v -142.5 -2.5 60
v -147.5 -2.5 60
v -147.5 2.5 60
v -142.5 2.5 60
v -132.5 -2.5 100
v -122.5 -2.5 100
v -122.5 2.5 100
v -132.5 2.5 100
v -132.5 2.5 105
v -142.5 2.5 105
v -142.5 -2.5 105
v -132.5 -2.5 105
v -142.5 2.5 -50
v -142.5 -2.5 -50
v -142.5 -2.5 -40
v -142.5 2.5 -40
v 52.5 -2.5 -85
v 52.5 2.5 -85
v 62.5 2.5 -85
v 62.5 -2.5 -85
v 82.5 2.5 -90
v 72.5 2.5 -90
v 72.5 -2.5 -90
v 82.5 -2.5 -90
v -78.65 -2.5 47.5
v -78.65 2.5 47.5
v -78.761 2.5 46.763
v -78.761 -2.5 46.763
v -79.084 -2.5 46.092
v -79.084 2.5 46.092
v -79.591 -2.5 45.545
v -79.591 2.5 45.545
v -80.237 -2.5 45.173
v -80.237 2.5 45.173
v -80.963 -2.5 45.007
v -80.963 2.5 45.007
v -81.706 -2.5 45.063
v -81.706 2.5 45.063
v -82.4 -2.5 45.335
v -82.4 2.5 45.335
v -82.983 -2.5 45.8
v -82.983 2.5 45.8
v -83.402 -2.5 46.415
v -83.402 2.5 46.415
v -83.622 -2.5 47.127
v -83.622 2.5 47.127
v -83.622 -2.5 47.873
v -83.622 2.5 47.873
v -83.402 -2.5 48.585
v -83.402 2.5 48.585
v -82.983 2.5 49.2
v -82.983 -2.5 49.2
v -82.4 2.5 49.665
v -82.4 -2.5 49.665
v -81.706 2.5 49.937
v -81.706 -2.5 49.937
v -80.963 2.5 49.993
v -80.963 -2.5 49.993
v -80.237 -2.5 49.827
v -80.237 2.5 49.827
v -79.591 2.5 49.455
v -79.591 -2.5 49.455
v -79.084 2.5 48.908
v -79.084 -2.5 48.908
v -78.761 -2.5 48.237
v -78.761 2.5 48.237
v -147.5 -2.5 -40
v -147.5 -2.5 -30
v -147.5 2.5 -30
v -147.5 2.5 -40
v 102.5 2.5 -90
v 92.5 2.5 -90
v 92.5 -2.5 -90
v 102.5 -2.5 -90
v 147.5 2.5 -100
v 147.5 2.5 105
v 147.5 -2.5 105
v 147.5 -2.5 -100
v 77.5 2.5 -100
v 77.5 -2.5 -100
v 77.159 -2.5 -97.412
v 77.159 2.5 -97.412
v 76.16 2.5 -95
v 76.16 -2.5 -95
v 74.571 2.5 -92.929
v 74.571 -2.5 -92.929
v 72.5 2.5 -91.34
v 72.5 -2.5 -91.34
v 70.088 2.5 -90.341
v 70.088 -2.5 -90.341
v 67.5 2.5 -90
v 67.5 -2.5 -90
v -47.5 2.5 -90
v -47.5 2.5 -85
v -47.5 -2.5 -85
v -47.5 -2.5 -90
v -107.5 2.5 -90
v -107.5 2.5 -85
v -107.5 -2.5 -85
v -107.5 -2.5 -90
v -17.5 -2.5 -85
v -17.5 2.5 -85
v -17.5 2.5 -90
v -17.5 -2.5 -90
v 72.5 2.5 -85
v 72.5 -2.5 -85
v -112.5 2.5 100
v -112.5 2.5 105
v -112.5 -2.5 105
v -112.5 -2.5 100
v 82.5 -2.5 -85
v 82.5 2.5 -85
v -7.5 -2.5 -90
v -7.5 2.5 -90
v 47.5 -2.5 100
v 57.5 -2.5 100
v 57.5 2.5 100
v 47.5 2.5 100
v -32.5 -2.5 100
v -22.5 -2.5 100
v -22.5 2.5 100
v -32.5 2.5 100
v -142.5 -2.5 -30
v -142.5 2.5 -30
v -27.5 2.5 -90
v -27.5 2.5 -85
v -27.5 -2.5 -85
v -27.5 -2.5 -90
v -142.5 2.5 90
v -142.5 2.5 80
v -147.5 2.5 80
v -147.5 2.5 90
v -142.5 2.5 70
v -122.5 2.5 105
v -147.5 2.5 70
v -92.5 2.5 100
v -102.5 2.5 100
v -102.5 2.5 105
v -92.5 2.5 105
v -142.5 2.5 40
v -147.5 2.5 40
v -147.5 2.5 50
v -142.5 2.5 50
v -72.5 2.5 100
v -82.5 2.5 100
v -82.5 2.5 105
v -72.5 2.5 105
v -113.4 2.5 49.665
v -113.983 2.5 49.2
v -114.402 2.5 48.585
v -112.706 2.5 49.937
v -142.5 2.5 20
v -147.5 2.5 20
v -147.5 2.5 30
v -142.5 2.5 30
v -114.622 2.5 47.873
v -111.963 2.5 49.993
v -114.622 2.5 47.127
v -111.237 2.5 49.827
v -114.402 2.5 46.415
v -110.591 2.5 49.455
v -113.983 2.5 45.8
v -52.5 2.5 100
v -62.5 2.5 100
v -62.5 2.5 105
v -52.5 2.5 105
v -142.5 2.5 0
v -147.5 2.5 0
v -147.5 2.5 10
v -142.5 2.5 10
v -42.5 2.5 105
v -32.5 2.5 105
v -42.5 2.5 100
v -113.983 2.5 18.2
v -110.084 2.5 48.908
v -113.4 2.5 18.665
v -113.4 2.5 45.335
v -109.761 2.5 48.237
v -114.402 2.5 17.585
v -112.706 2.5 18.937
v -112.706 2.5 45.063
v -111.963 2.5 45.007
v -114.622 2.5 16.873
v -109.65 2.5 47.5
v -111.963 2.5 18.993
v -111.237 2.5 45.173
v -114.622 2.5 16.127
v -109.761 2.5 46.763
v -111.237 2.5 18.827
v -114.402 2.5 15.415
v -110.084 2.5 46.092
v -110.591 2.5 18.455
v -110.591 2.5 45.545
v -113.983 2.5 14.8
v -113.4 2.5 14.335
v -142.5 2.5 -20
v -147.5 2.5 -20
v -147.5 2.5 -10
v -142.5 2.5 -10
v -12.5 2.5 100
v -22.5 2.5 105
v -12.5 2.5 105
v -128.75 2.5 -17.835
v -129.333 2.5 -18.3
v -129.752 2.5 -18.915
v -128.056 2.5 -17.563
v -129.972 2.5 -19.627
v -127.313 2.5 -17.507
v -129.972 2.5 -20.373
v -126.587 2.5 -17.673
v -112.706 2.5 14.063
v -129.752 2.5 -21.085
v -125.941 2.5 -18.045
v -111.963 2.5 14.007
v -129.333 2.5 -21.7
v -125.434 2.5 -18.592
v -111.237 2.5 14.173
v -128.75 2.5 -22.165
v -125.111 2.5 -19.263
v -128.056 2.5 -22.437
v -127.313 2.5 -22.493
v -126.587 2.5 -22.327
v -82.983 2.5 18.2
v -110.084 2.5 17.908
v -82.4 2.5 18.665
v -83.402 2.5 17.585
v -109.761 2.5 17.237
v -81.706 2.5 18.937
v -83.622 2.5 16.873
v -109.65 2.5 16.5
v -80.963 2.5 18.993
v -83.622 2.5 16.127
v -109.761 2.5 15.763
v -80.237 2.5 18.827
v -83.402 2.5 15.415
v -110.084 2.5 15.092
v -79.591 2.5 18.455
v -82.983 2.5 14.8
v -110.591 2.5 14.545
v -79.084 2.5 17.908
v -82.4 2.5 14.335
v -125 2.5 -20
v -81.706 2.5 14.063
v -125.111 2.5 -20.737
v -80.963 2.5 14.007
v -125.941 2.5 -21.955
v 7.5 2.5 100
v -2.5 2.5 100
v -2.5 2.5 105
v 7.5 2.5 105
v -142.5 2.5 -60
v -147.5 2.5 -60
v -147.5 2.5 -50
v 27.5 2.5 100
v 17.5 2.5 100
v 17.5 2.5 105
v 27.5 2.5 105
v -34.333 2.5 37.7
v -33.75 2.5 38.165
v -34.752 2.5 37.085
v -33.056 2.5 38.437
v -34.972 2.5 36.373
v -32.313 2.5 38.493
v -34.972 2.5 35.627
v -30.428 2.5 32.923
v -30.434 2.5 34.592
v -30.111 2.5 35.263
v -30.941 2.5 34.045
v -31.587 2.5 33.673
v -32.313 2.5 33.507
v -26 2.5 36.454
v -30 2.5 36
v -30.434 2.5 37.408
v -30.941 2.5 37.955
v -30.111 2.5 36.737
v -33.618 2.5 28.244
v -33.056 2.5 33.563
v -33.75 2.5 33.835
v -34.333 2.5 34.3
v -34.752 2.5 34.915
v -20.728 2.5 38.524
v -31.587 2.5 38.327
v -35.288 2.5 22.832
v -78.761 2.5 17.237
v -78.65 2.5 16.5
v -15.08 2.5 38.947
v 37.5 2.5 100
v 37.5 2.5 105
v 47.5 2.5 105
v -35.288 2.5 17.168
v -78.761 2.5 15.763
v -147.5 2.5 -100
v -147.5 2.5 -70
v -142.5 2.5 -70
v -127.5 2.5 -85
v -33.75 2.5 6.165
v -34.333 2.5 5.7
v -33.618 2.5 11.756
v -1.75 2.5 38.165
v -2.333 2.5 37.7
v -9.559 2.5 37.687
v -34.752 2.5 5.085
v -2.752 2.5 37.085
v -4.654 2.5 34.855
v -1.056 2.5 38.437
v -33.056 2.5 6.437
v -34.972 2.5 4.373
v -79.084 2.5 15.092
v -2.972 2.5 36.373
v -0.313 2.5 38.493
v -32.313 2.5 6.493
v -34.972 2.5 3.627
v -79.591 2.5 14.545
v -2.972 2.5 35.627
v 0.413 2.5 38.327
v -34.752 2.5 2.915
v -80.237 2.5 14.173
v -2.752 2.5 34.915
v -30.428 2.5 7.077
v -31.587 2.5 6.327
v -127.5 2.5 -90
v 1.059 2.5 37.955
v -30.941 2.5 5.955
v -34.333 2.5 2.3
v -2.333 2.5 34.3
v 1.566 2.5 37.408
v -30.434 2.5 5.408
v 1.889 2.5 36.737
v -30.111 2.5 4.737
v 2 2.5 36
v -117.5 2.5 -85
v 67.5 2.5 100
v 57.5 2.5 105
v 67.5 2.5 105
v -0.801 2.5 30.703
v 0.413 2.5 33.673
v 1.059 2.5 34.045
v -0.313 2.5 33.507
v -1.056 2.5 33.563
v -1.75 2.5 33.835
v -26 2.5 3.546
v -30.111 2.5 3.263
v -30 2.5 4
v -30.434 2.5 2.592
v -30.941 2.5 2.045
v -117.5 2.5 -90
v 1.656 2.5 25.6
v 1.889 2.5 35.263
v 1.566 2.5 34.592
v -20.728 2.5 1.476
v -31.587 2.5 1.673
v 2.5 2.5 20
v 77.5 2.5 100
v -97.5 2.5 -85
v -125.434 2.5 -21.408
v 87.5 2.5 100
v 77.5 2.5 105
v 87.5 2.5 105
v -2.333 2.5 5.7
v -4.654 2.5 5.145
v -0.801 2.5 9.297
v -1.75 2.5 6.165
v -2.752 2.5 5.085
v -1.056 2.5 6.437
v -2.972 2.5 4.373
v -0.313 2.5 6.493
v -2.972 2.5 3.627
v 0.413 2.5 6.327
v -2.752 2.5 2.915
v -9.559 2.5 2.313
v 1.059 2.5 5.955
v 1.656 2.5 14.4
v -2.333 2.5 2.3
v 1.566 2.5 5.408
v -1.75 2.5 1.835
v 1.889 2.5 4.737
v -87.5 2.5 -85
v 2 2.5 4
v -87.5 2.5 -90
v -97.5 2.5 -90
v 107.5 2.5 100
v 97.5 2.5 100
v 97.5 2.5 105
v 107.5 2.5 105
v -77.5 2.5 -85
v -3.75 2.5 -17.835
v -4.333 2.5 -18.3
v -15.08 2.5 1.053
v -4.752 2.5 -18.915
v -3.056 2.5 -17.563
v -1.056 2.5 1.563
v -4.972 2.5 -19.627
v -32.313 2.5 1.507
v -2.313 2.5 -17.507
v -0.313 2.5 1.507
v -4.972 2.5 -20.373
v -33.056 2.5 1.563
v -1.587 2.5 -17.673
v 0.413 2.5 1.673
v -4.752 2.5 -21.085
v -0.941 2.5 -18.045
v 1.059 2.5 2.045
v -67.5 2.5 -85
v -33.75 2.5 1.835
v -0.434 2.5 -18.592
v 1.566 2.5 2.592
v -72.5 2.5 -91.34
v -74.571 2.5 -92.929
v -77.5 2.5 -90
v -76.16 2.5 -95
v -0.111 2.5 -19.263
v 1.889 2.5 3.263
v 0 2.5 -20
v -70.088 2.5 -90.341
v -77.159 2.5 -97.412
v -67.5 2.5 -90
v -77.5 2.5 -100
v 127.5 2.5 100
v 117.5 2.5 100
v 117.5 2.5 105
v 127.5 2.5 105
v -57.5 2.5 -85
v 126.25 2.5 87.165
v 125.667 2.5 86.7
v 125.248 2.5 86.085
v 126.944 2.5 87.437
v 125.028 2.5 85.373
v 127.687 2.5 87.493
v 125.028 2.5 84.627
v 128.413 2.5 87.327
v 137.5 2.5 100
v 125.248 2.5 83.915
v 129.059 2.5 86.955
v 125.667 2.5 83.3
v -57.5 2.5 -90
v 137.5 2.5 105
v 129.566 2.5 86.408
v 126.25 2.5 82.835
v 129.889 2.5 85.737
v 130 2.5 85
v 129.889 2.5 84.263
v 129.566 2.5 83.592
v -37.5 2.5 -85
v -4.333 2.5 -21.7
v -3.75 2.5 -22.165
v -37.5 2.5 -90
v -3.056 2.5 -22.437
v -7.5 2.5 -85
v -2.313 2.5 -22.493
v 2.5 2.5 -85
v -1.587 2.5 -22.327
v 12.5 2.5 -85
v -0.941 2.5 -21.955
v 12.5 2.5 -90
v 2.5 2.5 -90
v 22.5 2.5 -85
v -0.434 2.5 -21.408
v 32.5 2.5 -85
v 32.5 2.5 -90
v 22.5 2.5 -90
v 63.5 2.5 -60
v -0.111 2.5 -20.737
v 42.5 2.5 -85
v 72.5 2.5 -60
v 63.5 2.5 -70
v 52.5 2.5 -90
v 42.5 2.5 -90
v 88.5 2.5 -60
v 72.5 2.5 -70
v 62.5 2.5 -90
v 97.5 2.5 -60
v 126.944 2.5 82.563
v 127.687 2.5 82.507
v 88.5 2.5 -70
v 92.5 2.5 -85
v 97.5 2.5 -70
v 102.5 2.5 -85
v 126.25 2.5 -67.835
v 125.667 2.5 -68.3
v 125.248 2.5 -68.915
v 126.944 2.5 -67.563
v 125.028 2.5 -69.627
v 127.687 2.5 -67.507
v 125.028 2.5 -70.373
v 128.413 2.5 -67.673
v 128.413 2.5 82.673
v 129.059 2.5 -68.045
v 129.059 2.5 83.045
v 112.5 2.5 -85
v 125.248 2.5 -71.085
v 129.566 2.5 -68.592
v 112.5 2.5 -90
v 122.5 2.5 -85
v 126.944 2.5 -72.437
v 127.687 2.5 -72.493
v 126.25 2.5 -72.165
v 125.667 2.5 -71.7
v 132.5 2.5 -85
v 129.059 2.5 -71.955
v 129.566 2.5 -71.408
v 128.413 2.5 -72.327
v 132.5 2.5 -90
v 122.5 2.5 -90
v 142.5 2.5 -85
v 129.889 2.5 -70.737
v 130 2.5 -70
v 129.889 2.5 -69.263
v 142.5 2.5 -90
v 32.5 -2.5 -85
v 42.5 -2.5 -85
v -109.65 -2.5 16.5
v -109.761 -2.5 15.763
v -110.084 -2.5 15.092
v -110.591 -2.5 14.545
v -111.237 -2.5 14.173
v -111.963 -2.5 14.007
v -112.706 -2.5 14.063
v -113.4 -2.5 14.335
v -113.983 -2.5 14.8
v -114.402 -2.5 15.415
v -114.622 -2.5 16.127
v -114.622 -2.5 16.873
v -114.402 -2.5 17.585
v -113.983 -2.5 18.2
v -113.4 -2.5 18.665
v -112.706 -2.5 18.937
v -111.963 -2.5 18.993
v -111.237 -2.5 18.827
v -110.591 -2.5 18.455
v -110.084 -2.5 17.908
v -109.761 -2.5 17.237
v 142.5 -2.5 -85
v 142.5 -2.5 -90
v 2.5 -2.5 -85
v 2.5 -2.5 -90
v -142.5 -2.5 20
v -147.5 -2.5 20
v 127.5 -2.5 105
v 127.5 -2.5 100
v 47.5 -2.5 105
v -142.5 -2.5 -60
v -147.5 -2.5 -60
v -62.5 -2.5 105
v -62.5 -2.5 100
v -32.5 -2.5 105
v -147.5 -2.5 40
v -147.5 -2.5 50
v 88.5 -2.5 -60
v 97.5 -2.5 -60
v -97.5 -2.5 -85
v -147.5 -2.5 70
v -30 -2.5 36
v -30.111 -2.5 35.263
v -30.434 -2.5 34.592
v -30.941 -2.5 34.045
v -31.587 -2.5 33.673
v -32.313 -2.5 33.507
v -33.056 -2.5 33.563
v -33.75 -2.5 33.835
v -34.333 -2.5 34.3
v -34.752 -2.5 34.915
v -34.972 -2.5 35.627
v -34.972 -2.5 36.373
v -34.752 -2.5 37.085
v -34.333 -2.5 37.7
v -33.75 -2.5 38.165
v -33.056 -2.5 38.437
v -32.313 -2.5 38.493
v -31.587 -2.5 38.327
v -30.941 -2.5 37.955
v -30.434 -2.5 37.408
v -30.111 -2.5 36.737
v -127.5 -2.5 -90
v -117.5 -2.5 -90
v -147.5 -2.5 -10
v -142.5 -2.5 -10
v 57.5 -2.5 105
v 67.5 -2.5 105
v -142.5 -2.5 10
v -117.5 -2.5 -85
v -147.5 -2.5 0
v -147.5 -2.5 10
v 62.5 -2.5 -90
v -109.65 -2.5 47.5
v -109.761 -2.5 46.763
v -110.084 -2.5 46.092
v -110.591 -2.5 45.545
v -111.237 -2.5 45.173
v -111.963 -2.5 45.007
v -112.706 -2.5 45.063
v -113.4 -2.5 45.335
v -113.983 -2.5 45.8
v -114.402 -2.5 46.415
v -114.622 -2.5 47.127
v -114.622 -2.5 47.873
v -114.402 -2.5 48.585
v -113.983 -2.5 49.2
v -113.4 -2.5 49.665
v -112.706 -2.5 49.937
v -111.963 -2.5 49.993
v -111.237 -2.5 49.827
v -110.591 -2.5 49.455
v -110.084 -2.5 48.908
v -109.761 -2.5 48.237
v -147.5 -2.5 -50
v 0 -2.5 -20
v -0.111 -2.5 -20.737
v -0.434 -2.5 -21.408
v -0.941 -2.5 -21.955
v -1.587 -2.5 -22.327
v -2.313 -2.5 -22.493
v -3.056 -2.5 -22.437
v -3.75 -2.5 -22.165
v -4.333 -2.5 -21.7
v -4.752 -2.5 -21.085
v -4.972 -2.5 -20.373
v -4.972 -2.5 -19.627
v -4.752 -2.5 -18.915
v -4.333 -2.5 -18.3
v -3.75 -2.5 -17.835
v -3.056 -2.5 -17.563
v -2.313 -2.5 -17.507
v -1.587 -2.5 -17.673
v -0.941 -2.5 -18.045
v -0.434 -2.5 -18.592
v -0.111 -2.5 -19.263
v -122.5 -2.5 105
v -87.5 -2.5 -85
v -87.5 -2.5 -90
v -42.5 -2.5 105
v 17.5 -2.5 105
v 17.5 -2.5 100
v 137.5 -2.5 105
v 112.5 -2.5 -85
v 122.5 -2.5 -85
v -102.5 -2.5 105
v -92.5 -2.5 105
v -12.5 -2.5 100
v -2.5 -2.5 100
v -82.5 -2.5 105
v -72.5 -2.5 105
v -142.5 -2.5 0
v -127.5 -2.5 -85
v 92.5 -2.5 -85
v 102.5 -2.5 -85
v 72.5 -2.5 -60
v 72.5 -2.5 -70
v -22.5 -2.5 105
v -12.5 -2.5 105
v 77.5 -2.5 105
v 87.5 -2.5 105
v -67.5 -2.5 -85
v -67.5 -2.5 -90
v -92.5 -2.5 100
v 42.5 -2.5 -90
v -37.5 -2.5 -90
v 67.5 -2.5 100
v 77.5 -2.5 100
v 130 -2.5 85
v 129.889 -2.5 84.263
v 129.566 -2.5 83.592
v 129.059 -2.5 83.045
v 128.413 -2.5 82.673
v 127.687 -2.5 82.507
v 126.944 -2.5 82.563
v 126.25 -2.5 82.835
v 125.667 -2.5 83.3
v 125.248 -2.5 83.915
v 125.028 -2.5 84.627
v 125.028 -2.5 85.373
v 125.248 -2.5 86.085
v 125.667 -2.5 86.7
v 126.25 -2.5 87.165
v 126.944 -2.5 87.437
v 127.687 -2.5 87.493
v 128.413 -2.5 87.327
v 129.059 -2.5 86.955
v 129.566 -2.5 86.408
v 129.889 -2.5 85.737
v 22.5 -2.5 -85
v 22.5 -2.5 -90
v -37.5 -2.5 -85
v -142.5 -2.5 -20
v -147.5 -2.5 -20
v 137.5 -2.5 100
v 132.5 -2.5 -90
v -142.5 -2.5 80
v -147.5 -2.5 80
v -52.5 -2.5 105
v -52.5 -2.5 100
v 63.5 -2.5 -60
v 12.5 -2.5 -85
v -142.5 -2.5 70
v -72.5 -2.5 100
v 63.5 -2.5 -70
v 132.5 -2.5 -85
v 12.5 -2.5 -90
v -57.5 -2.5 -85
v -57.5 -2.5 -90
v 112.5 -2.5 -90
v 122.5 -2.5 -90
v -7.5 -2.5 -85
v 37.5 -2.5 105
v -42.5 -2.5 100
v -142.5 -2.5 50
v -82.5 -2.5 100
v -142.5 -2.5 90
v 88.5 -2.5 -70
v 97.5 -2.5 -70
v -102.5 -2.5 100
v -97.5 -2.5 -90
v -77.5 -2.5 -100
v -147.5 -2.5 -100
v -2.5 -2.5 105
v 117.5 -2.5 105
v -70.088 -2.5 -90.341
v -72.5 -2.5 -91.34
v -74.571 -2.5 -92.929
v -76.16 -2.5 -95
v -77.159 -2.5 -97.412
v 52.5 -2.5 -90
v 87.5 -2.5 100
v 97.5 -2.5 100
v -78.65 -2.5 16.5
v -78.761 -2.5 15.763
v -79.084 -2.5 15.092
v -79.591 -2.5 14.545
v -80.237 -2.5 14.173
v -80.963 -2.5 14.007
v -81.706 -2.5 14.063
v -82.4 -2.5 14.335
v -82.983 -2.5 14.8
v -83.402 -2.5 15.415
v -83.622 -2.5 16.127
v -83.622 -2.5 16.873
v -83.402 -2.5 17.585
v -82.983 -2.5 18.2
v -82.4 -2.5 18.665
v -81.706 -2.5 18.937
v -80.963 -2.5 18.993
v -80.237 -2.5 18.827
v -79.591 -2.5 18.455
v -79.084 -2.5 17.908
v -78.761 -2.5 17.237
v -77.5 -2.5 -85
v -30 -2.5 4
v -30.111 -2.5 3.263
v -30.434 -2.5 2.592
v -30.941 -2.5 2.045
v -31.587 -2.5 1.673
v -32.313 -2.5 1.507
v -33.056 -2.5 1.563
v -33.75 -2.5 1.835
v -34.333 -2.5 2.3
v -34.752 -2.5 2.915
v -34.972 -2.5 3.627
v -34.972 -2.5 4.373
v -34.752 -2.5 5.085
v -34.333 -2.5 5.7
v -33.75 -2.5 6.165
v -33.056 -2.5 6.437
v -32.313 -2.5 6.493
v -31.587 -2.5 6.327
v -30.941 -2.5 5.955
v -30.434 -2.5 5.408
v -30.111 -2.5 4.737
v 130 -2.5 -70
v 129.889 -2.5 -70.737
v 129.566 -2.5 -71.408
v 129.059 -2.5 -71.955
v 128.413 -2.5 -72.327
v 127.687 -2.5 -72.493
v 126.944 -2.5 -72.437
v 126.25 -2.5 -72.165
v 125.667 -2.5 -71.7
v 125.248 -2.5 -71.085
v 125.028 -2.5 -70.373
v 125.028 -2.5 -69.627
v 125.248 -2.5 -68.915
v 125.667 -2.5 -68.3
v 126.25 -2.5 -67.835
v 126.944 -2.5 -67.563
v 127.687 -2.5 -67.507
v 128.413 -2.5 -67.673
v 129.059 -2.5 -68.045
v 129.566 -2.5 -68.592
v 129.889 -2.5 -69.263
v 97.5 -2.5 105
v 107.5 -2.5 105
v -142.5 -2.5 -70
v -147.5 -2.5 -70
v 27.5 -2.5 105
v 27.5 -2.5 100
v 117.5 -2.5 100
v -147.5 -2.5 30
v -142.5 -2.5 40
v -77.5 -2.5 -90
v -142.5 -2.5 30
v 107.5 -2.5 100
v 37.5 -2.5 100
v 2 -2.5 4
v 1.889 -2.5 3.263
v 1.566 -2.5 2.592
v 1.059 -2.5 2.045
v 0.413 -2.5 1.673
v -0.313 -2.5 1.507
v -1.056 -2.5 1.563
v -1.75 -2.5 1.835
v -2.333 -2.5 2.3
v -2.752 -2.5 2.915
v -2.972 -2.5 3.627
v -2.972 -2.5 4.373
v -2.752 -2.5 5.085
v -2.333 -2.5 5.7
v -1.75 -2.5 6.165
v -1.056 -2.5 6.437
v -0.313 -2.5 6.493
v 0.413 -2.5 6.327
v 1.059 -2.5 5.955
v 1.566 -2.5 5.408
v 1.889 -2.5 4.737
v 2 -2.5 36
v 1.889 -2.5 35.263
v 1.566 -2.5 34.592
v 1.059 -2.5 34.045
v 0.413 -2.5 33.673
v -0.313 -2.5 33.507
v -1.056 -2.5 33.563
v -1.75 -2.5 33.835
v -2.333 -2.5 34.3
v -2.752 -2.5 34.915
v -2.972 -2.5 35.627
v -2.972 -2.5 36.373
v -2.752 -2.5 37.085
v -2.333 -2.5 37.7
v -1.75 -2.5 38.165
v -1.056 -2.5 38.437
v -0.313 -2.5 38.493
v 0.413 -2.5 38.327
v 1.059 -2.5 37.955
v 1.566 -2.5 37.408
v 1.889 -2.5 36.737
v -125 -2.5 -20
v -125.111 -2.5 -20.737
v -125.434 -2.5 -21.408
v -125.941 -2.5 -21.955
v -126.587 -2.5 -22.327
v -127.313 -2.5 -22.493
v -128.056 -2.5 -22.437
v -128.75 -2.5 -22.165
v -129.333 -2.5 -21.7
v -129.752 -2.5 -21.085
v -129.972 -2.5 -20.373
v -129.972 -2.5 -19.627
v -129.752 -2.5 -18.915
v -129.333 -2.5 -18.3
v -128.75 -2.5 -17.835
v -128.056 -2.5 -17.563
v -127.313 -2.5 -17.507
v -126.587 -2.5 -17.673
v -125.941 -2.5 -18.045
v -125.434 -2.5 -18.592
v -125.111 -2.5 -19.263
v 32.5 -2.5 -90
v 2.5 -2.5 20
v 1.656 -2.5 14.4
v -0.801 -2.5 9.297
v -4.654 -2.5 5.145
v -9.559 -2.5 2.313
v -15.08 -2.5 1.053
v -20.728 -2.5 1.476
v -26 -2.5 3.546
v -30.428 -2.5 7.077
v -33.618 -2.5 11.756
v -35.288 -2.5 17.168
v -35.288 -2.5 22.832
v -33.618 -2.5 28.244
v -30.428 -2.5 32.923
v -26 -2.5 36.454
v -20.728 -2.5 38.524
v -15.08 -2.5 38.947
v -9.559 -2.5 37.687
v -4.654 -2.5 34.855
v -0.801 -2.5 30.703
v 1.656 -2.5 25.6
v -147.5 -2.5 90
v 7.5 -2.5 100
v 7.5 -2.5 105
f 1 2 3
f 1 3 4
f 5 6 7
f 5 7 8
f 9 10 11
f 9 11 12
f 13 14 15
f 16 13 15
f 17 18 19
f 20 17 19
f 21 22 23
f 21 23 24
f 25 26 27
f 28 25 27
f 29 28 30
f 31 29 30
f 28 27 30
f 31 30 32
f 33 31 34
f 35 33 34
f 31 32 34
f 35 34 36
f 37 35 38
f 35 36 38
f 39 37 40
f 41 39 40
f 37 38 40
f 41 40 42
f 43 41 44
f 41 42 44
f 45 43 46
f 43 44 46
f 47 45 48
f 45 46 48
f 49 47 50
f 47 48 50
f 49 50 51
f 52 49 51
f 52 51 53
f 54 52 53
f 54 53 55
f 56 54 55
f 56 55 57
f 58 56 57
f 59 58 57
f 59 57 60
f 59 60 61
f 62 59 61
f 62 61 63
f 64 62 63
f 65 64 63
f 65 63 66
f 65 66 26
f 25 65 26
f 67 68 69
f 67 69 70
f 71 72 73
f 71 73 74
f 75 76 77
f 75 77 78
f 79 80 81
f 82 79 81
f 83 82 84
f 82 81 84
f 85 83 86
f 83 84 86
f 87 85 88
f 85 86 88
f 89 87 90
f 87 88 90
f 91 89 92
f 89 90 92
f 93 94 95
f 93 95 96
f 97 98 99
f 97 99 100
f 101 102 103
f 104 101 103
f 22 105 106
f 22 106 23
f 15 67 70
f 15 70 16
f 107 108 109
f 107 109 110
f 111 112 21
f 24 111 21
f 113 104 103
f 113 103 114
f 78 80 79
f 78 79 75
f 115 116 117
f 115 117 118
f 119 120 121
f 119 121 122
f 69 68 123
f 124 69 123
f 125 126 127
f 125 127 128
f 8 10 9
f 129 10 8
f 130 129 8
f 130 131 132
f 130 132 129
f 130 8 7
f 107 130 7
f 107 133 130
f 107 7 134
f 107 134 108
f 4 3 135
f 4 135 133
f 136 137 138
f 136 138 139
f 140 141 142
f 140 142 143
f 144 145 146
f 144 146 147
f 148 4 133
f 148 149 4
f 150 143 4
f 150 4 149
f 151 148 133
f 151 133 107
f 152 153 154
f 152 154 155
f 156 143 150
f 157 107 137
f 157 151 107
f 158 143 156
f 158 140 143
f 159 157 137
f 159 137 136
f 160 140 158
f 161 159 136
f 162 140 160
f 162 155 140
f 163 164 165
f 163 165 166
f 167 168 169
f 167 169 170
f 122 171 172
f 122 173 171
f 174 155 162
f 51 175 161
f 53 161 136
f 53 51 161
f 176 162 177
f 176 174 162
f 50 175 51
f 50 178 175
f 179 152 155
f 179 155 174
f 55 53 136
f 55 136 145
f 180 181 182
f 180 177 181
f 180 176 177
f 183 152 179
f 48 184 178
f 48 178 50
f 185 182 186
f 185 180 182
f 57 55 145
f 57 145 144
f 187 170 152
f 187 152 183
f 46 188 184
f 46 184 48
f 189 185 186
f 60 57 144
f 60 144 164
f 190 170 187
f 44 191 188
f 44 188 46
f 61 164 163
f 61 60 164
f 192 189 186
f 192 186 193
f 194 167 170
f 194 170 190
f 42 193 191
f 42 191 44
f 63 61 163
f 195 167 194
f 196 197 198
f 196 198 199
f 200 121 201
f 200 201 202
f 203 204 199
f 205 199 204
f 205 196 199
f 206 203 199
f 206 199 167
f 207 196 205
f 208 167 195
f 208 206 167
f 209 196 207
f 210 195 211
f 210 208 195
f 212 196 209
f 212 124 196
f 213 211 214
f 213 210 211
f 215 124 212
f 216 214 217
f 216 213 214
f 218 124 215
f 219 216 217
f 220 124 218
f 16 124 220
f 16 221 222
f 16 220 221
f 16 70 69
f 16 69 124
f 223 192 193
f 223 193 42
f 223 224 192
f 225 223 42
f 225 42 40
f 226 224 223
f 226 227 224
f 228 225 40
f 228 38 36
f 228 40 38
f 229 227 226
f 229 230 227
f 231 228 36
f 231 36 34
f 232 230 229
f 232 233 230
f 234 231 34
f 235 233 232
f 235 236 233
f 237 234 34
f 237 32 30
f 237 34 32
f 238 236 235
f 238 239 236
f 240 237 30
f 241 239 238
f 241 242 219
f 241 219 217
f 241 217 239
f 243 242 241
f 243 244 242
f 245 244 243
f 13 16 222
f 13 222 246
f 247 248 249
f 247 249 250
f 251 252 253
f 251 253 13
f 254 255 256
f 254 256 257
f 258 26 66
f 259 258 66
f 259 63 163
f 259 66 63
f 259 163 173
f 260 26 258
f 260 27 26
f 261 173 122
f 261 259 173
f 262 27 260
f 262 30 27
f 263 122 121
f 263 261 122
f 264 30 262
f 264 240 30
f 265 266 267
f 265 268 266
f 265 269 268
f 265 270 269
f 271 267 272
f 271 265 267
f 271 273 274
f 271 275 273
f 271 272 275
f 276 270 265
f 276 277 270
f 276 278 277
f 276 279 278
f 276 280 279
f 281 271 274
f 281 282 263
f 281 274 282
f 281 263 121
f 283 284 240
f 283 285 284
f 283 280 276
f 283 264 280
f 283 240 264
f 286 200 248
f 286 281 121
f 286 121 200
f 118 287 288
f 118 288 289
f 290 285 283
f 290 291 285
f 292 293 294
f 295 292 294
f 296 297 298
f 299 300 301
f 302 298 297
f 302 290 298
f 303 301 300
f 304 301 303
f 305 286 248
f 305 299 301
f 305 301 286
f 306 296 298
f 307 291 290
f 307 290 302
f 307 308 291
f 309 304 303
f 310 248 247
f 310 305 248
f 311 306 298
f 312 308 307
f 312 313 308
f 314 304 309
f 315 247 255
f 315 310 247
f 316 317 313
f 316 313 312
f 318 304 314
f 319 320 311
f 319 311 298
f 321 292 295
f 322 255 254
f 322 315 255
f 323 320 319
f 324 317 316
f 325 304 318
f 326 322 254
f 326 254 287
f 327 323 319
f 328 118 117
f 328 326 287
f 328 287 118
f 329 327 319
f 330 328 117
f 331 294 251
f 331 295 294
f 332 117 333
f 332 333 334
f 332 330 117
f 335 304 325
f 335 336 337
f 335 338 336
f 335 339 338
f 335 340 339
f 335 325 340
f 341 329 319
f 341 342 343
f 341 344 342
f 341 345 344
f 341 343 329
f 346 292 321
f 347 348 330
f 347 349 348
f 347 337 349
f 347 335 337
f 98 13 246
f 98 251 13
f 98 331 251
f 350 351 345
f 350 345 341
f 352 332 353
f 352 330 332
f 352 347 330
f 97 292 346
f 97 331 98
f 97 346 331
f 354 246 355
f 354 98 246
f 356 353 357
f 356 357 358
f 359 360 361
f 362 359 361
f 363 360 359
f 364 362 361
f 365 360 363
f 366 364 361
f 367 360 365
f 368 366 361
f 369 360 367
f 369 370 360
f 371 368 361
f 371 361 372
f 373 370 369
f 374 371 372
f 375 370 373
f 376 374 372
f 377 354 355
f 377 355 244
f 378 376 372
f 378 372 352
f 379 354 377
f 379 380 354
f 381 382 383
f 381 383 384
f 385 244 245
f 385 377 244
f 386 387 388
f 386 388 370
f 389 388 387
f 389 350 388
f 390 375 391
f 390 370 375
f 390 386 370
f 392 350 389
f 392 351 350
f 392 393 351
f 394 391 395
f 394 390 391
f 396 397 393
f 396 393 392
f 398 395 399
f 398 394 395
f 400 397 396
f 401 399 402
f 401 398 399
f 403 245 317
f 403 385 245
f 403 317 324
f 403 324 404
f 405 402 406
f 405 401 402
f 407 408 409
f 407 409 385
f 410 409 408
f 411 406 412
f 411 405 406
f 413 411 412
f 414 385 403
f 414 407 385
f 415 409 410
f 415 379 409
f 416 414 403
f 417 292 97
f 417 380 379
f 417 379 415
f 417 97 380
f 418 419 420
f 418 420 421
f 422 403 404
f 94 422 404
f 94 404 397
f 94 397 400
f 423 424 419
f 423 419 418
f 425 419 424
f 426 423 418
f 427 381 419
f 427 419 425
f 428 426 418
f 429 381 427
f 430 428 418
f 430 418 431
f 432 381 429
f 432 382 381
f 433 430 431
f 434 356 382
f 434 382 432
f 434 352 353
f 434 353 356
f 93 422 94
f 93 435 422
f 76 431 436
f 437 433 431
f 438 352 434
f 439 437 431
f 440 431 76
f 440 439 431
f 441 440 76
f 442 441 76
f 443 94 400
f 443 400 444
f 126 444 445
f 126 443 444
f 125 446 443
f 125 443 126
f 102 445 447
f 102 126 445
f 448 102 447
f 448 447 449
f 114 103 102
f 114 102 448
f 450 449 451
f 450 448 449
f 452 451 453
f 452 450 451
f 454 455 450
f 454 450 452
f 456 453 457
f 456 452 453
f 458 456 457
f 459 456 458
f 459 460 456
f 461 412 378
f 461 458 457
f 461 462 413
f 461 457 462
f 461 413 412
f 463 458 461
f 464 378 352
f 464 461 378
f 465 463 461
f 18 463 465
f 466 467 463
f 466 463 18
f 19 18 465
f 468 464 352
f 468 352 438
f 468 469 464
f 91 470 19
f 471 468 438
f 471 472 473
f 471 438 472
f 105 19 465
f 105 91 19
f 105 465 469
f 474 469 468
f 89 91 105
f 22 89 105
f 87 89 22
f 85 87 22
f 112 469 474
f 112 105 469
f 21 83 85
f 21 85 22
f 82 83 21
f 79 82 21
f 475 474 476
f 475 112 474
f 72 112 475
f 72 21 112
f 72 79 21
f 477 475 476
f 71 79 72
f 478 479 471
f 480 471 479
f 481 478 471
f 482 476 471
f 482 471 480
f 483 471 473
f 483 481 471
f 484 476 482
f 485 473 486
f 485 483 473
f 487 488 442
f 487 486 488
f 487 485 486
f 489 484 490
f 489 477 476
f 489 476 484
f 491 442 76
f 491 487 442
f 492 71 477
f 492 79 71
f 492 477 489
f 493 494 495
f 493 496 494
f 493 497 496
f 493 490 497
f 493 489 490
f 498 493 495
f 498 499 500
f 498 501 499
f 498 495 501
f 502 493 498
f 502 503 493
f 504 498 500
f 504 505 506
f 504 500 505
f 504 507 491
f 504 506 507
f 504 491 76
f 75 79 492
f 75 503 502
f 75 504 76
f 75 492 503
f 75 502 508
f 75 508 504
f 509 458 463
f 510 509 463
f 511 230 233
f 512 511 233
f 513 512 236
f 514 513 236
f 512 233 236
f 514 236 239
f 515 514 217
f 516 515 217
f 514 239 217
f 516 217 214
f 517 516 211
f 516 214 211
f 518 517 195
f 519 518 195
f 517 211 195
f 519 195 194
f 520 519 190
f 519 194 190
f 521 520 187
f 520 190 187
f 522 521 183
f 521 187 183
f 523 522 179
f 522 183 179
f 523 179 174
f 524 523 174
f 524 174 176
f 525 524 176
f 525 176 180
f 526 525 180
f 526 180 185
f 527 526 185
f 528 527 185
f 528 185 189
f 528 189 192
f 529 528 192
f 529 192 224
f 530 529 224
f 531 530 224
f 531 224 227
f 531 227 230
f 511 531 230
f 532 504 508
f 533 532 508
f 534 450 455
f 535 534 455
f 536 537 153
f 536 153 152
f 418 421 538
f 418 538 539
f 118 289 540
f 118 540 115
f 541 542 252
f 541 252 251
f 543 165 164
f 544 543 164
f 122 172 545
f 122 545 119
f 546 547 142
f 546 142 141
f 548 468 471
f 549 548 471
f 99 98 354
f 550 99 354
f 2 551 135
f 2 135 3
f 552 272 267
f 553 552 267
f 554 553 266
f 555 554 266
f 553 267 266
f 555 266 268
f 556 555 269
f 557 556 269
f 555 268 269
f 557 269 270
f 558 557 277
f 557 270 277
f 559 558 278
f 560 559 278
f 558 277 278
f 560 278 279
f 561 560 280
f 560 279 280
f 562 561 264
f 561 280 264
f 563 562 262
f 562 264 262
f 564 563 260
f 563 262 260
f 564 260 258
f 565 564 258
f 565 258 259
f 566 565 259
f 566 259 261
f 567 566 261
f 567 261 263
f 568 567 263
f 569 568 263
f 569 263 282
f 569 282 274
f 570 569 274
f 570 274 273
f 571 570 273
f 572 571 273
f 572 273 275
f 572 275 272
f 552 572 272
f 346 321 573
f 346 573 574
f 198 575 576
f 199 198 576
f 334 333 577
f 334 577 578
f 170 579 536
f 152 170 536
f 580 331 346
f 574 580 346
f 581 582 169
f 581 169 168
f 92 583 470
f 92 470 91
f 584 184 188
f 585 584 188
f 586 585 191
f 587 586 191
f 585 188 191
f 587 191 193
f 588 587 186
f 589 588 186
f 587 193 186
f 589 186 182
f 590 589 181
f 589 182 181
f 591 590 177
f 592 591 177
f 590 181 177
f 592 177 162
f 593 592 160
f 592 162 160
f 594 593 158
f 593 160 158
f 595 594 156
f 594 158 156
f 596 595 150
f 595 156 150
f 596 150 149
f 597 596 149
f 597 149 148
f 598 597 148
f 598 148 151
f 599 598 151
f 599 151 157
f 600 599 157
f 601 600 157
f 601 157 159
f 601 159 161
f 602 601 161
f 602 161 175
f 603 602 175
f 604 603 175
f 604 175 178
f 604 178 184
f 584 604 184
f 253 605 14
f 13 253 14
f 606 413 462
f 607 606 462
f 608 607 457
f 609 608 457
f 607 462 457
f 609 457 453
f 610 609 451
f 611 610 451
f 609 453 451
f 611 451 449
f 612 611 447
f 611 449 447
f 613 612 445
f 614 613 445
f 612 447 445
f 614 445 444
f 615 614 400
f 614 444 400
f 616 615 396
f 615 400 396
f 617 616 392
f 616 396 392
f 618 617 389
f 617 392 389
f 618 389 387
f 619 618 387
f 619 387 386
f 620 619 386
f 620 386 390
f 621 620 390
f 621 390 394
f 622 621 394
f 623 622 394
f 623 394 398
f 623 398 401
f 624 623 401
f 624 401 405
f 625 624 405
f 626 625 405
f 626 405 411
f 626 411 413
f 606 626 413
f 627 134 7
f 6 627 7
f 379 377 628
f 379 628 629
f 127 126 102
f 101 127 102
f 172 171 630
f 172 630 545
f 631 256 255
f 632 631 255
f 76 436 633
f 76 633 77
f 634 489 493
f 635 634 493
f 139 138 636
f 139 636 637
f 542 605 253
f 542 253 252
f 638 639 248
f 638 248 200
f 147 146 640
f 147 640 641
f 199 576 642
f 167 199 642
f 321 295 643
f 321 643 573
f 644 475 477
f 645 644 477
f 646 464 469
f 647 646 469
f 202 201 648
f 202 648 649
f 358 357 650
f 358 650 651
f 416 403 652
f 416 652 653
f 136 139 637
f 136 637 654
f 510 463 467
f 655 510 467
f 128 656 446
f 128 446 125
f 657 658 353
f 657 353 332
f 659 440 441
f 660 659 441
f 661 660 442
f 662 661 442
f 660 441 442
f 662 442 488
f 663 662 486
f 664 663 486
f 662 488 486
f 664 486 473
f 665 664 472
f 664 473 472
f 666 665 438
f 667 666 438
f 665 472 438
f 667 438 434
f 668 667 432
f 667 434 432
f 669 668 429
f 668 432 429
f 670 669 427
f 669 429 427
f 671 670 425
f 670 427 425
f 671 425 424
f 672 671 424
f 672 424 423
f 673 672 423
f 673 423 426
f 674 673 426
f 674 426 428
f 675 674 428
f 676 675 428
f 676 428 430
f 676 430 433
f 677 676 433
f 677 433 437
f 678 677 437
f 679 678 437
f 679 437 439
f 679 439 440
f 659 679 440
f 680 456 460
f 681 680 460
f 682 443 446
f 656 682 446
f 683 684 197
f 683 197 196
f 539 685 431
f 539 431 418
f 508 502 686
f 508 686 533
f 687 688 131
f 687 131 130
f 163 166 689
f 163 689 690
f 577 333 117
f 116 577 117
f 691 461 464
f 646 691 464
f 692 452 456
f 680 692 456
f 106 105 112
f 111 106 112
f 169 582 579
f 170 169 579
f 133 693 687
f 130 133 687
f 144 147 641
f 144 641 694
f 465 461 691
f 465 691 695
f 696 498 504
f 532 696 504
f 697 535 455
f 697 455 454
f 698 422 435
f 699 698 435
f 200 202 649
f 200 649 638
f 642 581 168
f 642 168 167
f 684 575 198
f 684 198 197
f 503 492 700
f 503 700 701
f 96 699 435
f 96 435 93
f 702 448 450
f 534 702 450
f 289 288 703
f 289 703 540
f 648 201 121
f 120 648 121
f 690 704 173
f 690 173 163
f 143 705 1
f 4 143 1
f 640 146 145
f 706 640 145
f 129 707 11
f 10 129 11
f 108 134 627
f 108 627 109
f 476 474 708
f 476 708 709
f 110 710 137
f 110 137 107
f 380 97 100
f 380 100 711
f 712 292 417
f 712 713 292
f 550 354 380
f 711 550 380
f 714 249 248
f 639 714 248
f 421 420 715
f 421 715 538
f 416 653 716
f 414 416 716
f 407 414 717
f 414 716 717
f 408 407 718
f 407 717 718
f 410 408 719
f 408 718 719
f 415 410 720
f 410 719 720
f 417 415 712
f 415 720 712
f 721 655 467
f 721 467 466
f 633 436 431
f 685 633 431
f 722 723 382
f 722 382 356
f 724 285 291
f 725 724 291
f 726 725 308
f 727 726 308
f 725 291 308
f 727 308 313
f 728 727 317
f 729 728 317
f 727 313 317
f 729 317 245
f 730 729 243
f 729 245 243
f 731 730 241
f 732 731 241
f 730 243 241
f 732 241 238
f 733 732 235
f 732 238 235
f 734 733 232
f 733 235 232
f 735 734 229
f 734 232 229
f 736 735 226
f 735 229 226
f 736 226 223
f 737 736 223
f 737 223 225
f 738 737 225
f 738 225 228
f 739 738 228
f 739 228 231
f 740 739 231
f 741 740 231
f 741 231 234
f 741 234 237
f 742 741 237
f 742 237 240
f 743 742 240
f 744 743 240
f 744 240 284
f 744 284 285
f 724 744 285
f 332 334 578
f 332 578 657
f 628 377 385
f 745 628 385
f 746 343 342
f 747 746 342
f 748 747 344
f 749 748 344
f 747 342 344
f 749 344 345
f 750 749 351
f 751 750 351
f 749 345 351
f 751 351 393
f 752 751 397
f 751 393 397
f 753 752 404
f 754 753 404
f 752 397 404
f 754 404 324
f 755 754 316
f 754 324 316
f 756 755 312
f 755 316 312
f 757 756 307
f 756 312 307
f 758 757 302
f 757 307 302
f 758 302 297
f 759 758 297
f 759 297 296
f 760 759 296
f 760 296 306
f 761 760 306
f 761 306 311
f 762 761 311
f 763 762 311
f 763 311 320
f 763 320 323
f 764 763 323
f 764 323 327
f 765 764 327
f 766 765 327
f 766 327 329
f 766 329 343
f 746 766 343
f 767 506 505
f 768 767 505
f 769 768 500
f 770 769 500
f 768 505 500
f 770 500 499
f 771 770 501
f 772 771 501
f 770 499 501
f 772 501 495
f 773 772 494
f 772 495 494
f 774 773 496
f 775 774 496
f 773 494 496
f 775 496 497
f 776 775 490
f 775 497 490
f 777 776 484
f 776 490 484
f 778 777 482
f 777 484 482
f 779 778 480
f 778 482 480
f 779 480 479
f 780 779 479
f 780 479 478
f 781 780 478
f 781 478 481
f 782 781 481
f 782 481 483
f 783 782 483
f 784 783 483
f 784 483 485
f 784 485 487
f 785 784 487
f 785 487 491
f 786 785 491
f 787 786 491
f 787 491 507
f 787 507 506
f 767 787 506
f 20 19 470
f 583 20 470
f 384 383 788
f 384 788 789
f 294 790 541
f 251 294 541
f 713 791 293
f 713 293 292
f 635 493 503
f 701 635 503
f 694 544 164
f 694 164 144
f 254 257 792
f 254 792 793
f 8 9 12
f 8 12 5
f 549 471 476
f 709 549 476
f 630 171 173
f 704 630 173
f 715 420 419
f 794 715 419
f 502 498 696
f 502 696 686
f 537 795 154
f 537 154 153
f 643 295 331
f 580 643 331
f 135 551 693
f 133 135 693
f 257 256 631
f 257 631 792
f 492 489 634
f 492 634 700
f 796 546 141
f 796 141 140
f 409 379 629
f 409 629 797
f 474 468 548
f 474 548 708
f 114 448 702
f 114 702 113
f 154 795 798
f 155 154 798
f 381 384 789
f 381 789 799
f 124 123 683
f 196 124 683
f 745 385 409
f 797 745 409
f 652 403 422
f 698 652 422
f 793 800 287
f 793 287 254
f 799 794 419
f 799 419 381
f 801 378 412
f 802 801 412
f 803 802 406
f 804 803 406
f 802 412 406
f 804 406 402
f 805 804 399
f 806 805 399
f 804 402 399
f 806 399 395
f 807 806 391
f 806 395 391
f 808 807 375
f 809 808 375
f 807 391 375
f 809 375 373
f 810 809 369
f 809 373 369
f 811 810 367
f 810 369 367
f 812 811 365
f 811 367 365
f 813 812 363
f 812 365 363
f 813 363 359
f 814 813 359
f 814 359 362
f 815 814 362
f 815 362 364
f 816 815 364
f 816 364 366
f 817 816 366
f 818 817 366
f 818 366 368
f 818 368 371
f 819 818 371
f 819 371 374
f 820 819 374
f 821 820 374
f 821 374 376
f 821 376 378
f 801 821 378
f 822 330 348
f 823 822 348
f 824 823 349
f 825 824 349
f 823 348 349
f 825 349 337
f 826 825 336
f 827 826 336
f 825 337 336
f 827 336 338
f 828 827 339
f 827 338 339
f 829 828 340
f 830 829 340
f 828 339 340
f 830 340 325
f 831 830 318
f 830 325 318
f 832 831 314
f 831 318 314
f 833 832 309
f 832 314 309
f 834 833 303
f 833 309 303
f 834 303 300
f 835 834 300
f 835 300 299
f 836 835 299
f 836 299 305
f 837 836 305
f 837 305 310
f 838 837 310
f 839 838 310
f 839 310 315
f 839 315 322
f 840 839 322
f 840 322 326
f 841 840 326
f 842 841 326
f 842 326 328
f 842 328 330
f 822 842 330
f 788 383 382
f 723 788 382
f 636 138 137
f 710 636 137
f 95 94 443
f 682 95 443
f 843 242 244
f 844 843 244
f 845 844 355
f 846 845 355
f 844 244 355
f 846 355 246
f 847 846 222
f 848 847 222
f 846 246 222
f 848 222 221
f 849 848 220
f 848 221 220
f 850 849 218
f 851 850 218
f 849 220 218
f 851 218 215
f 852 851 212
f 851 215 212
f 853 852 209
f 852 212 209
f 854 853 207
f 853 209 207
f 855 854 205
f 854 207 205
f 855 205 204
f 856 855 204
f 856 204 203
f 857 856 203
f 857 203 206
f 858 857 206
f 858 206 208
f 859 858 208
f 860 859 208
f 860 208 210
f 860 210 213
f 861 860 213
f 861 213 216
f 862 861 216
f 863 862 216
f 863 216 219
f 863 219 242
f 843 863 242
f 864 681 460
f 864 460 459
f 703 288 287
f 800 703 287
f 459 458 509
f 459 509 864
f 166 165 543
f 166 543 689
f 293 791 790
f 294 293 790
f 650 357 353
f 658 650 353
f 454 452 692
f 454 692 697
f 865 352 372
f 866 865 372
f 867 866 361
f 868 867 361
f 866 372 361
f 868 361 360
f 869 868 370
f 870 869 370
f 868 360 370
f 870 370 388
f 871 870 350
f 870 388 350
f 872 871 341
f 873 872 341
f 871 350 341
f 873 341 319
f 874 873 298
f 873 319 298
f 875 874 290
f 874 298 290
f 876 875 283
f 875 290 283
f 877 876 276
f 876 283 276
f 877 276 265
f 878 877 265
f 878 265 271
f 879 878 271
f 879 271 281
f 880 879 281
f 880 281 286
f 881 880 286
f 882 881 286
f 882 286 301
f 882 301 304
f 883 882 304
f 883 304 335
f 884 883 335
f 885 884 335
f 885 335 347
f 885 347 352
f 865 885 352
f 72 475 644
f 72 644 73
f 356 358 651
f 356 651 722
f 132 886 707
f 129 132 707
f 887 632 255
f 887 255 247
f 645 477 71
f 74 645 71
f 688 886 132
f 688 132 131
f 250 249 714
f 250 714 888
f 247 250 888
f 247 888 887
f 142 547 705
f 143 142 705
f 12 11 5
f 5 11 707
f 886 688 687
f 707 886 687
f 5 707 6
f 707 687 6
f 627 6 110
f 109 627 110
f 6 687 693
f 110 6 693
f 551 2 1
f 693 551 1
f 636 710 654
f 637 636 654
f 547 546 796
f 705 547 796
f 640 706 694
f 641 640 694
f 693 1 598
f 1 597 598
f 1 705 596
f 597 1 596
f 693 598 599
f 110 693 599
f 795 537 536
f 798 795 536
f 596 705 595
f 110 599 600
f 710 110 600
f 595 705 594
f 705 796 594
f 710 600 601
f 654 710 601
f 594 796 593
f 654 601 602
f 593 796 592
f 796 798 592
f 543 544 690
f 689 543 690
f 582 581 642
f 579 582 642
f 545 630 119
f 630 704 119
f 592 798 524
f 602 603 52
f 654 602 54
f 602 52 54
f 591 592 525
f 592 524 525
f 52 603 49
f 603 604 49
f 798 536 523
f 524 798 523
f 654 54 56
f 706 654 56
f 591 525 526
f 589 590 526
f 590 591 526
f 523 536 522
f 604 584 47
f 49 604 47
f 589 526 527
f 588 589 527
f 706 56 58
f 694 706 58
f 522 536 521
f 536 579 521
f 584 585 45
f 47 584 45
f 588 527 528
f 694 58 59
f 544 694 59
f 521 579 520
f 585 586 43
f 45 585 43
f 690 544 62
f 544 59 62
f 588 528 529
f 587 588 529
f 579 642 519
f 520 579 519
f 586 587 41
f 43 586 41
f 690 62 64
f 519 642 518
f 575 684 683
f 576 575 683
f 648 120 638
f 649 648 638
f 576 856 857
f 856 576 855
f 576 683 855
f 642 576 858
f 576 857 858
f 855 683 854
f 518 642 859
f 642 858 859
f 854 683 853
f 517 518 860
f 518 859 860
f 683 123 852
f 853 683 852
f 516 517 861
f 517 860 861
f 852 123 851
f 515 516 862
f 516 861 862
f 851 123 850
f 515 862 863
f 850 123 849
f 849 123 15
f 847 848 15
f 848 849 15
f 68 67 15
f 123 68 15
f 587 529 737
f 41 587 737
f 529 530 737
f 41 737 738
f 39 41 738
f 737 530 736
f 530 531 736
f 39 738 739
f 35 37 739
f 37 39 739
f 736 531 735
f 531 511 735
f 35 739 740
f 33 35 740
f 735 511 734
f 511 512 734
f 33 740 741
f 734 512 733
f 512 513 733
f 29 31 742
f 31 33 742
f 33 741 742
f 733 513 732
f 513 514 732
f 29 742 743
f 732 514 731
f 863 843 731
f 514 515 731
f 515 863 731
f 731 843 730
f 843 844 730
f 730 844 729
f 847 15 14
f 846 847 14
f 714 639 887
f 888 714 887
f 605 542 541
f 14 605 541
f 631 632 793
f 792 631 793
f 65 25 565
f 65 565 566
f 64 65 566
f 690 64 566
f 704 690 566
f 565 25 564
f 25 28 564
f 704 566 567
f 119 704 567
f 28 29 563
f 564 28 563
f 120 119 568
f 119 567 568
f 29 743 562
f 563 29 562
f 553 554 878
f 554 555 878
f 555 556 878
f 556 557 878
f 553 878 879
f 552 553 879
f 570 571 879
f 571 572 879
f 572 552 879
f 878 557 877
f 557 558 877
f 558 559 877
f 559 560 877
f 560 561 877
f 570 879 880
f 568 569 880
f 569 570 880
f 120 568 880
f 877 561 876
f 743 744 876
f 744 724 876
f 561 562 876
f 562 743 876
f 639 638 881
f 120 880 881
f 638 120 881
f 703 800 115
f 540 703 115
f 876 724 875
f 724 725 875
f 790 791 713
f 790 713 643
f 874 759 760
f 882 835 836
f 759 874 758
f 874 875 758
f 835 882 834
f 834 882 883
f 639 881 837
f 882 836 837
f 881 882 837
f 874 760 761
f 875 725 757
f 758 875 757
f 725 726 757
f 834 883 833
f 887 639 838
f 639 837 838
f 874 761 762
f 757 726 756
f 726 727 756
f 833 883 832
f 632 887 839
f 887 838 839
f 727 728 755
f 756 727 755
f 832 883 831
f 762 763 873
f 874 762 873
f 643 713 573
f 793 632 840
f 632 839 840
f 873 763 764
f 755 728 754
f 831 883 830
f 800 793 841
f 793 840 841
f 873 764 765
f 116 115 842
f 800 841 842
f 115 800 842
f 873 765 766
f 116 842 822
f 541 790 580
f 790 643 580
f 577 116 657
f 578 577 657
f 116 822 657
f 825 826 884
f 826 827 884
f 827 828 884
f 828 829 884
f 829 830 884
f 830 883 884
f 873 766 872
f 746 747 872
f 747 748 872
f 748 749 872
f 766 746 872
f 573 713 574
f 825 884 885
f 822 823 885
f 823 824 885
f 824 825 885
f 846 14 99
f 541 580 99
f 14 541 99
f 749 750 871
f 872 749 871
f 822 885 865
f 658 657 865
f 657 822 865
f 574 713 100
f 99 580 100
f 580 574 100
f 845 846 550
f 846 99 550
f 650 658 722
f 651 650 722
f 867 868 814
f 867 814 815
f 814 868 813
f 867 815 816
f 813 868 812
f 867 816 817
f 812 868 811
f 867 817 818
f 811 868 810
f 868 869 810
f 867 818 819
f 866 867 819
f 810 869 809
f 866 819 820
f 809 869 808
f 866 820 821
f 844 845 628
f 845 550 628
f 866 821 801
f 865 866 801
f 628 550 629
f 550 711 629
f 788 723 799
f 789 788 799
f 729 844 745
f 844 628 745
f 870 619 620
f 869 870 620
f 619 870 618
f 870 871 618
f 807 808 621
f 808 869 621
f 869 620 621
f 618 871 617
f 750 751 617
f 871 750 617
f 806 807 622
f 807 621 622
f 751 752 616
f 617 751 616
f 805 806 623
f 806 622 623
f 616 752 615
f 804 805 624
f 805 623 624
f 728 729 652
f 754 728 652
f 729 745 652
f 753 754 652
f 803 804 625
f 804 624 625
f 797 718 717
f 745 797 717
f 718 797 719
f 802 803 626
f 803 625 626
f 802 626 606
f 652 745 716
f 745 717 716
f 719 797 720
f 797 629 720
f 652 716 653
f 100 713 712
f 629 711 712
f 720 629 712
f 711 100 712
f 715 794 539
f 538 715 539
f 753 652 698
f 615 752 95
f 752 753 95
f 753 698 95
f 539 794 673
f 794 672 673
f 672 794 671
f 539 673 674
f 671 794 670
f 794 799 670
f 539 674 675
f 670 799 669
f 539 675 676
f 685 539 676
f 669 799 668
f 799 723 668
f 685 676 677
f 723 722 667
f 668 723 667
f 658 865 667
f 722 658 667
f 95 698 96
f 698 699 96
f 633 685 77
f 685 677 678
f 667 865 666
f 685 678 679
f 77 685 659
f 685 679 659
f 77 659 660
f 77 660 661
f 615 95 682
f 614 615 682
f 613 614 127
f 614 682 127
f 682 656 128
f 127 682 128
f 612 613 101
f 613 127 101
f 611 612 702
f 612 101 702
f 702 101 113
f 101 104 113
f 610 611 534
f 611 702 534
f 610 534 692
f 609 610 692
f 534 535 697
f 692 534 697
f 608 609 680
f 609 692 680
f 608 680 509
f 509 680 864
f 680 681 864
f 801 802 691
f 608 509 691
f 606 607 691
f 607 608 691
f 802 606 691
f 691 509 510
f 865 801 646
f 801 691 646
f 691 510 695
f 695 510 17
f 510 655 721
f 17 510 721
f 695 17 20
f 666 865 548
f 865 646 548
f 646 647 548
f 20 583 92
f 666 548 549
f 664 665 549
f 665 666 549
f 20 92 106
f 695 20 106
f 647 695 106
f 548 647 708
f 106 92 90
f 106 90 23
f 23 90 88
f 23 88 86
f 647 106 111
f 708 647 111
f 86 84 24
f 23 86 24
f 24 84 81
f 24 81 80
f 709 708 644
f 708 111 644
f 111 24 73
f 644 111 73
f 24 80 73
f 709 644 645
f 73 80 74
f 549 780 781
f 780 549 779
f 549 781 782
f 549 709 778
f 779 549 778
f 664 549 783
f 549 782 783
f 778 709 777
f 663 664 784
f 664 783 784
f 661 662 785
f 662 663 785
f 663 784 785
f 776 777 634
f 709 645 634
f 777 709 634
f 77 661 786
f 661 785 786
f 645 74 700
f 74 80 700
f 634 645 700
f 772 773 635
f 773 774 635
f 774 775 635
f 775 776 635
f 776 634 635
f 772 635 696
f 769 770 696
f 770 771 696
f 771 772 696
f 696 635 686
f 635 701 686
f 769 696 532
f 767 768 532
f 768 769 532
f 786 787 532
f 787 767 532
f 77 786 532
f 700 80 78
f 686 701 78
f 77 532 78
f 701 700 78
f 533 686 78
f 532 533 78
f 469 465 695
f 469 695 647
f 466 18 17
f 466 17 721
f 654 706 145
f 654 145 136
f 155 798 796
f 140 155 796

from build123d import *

# Parameters (mm, degrees)
PAD_DEPTH       = 2.5
SKETCH001_W     = 5
SKETCH001_H     = 10
POCKET_DEPTH    = 5.001
SKETCH002_W     = 10
SKETCH002_H     = 5
PAD001_DEPTH    = 5
SKETCH003_W     = 10
SKETCH003_H     = 5
POCKET001_DEPTH = 5.001
SKETCH004_R     = 2.5
POCKET002_DEPTH = 5.001
SKETCH005_R     = 19
SKETCH005_R_2   = 2.5
POCKET003_DEPTH = 5.001
SKETCH006_W     = 9
SKETCH006_H     = 10
POCKET004_DEPTH = 5.001
SKETCH007_R     = 2.5
POCKET005_DEPTH = 5.001


with BuildPart() as part:
    # Sketch → Pad (new body, symmetric)
    with BuildSketch(Plane.XZ):
        with BuildLine():
            Line((-147.5, -100), (-77.5, -100))
            ThreePointArc((-67.5, -90), (-74.571068, -92.928932), (-77.5, -100))
            Line((-67.5, -90), (67.5, -90))
            ThreePointArc((77.5, -100), (74.571068, -92.928932), (67.5, -90))
            Line((77.5, -100), (147.5, -100))
            Line((147.5, -100), (147.5, 100))
            Line((147.5, 100), (-147.5, 100))
            Line((-147.5, 100), (-147.5, -100))
        make_face()
    extrude(amount=PAD_DEPTH, both=True)

    # Sketch001 (on Face10 of Pad) → Pocket (cut, through all)
    with BuildSketch(Plane.XZ.offset(2.5)):
        with Locations((-145, -65)):
            Rectangle(SKETCH001_W, SKETCH001_H)
        with Locations((-145, -45)):
            Rectangle(SKETCH001_W, SKETCH001_H)
        with Locations((-145, -25)):
            Rectangle(SKETCH001_W, SKETCH001_H)
        with Locations((-145, -5)):
            Rectangle(SKETCH001_W, SKETCH001_H)
        with Locations((-145, 15)):
            Rectangle(SKETCH001_W, SKETCH001_H)
        with Locations((-145, 35)):
            Rectangle(SKETCH001_W, SKETCH001_H)
        with Locations((-145, 55)):
            Rectangle(SKETCH001_W, SKETCH001_H)
        with Locations((-145, 75)):
            Rectangle(SKETCH001_W, SKETCH001_H)
        with Locations((-145, 95)):
            Rectangle(SKETCH001_W, SKETCH001_H)
        with Locations((-145, 115)):
            Rectangle(SKETCH001_W, SKETCH001_H)
    extrude(amount=-POCKET_DEPTH, mode=Mode.SUBTRACT)

    # Sketch002 (on Face4 of Pocket) → Pad001 (join)
    with BuildSketch(Plane(origin=(0, 2.5, 0), x_dir=(1, 0, 0), z_dir=(0, 1, 0))):
        with Locations((142.5, -102.5)):
            Rectangle(SKETCH002_W, SKETCH002_H)
        with Locations((122.5, -102.5)):
            Rectangle(SKETCH002_W, SKETCH002_H)
        with Locations((102.5, -102.5)):
            Rectangle(SKETCH002_W, SKETCH002_H)
        with Locations((82.5, -102.5)):
            Rectangle(SKETCH002_W, SKETCH002_H)
        with Locations((62.5, -102.5)):
            Rectangle(SKETCH002_W, SKETCH002_H)
        with Locations((42.5, -102.5)):
            Rectangle(SKETCH002_W, SKETCH002_H)
        with Locations((22.5, -102.5)):
            Rectangle(SKETCH002_W, SKETCH002_H)
        with Locations((2.5, -102.5)):
            Rectangle(SKETCH002_W, SKETCH002_H)
        with Locations((-17.5, -102.5)):
            Rectangle(SKETCH002_W, SKETCH002_H)
        with Locations((-37.5, -102.5)):
            Rectangle(SKETCH002_W, SKETCH002_H)
        with Locations((-57.5, -102.5)):
            Rectangle(SKETCH002_W, SKETCH002_H)
        with Locations((-77.5, -102.5)):
            Rectangle(SKETCH002_W, SKETCH002_H)
        with Locations((-97.5, -102.5)):
            Rectangle(SKETCH002_W, SKETCH002_H)
        with Locations((-117.5, -102.5)):
            Rectangle(SKETCH002_W, SKETCH002_H)
        with Locations((-137.5, -102.5)):
            Rectangle(SKETCH002_W, SKETCH002_H)
    extrude(amount=-PAD001_DEPTH)

    # Sketch003 (on Face98 of Pad001) → Pocket001 (cut, through all)
    with BuildSketch(Plane(origin=(0, 2.5, 0), x_dir=(1, 0, 0), z_dir=(0, 1, 0))):
        with Locations((-122.5, 87.5)):
            Rectangle(SKETCH003_W, SKETCH003_H)
        with Locations((-102.5, 87.5)):
            Rectangle(SKETCH003_W, SKETCH003_H)
        with Locations((-82.5, 87.5)):
            Rectangle(SKETCH003_W, SKETCH003_H)
        with Locations((-62.5, 87.5)):
            Rectangle(SKETCH003_W, SKETCH003_H)
        with Locations((-42.5, 87.5)):
            Rectangle(SKETCH003_W, SKETCH003_H)
        with Locations((-22.5, 87.5)):
            Rectangle(SKETCH003_W, SKETCH003_H)
        with Locations((-2.5, 87.5)):
            Rectangle(SKETCH003_W, SKETCH003_H)
        with Locations((17.5, 87.5)):
            Rectangle(SKETCH003_W, SKETCH003_H)
        with Locations((37.5, 87.5)):
            Rectangle(SKETCH003_W, SKETCH003_H)
        with Locations((57.5, 87.5)):
            Rectangle(SKETCH003_W, SKETCH003_H)
        with Locations((77.5, 87.5)):
            Rectangle(SKETCH003_W, SKETCH003_H)
        with Locations((97.5, 87.5)):
            Rectangle(SKETCH003_W, SKETCH003_H)
        with Locations((117.5, 87.5)):
            Rectangle(SKETCH003_W, SKETCH003_H)
        with Locations((137.5, 87.5)):
            Rectangle(SKETCH003_W, SKETCH003_H)
    extrude(amount=-POCKET001_DEPTH, mode=Mode.SUBTRACT)

    # Sketch004 (on Face4 of Pocket001) → Pocket002 (cut, through all)
    with BuildSketch(Plane(origin=(0, 2.5, 0), x_dir=(1, 0, 0), z_dir=(0, 1, 0))):
        with Locations((-127.5, 20)):
            Circle(SKETCH004_R)
        with Locations((-2.5, 20)):
            Circle(SKETCH004_R)
        with Locations((127.5, 70)):
            Circle(SKETCH004_R)
        with Locations((127.5, -85)):
            Circle(SKETCH004_R)
    extrude(amount=-POCKET002_DEPTH, mode=Mode.SUBTRACT)

    # Sketch005 (on Face4 of Pocket002) → Pocket003 (cut, through all)
    with BuildSketch(Plane(origin=(0, 2.5, 0), x_dir=(1, 0, 0), z_dir=(0, 1, 0))):
        with Locations((-16.5, -20)):
            Circle(SKETCH005_R)
        with Locations((-32.5, -4)):
            Circle(SKETCH005_R_2)
        with Locations((-0.5, -4)):
            Circle(SKETCH005_R_2)
        with Locations((-32.5, -36)):
            Circle(SKETCH005_R_2)
        with Locations((-0.5, -36)):
            Circle(SKETCH005_R_2)
    extrude(amount=-POCKET003_DEPTH, mode=Mode.SUBTRACT)

    # Sketch006 (on Face4 of Pocket003) → Pocket004 (cut, through all)
    with BuildSketch(Plane(origin=(0, 2.5, 0), x_dir=(1, 0, 0), z_dir=(0, 1, 0))):
        with Locations((68, 65)):
            Rectangle(SKETCH006_W, SKETCH006_H)
        with Locations((93, 65)):
            Rectangle(SKETCH006_W, SKETCH006_H)
    extrude(amount=-POCKET004_DEPTH, mode=Mode.SUBTRACT)

    # Sketch007 (on Face4 of Pocket004) → Pocket005 (cut, through all)
    with BuildSketch(Plane(origin=(0, 2.5, 0), x_dir=(1, 0, 0), z_dir=(0, 1, 0))):
        with Locations((-112.15, -16.5)):
            Circle(SKETCH007_R)
        with Locations((-81.15, -16.5)):
            Circle(SKETCH007_R)
        with Locations((-112.15, -47.5)):
            Circle(SKETCH007_R)
        with Locations((-81.15, -47.5)):
            Circle(SKETCH007_R)
    extrude(amount=-POCKET005_DEPTH, mode=Mode.SUBTRACT)


solid = part.part
